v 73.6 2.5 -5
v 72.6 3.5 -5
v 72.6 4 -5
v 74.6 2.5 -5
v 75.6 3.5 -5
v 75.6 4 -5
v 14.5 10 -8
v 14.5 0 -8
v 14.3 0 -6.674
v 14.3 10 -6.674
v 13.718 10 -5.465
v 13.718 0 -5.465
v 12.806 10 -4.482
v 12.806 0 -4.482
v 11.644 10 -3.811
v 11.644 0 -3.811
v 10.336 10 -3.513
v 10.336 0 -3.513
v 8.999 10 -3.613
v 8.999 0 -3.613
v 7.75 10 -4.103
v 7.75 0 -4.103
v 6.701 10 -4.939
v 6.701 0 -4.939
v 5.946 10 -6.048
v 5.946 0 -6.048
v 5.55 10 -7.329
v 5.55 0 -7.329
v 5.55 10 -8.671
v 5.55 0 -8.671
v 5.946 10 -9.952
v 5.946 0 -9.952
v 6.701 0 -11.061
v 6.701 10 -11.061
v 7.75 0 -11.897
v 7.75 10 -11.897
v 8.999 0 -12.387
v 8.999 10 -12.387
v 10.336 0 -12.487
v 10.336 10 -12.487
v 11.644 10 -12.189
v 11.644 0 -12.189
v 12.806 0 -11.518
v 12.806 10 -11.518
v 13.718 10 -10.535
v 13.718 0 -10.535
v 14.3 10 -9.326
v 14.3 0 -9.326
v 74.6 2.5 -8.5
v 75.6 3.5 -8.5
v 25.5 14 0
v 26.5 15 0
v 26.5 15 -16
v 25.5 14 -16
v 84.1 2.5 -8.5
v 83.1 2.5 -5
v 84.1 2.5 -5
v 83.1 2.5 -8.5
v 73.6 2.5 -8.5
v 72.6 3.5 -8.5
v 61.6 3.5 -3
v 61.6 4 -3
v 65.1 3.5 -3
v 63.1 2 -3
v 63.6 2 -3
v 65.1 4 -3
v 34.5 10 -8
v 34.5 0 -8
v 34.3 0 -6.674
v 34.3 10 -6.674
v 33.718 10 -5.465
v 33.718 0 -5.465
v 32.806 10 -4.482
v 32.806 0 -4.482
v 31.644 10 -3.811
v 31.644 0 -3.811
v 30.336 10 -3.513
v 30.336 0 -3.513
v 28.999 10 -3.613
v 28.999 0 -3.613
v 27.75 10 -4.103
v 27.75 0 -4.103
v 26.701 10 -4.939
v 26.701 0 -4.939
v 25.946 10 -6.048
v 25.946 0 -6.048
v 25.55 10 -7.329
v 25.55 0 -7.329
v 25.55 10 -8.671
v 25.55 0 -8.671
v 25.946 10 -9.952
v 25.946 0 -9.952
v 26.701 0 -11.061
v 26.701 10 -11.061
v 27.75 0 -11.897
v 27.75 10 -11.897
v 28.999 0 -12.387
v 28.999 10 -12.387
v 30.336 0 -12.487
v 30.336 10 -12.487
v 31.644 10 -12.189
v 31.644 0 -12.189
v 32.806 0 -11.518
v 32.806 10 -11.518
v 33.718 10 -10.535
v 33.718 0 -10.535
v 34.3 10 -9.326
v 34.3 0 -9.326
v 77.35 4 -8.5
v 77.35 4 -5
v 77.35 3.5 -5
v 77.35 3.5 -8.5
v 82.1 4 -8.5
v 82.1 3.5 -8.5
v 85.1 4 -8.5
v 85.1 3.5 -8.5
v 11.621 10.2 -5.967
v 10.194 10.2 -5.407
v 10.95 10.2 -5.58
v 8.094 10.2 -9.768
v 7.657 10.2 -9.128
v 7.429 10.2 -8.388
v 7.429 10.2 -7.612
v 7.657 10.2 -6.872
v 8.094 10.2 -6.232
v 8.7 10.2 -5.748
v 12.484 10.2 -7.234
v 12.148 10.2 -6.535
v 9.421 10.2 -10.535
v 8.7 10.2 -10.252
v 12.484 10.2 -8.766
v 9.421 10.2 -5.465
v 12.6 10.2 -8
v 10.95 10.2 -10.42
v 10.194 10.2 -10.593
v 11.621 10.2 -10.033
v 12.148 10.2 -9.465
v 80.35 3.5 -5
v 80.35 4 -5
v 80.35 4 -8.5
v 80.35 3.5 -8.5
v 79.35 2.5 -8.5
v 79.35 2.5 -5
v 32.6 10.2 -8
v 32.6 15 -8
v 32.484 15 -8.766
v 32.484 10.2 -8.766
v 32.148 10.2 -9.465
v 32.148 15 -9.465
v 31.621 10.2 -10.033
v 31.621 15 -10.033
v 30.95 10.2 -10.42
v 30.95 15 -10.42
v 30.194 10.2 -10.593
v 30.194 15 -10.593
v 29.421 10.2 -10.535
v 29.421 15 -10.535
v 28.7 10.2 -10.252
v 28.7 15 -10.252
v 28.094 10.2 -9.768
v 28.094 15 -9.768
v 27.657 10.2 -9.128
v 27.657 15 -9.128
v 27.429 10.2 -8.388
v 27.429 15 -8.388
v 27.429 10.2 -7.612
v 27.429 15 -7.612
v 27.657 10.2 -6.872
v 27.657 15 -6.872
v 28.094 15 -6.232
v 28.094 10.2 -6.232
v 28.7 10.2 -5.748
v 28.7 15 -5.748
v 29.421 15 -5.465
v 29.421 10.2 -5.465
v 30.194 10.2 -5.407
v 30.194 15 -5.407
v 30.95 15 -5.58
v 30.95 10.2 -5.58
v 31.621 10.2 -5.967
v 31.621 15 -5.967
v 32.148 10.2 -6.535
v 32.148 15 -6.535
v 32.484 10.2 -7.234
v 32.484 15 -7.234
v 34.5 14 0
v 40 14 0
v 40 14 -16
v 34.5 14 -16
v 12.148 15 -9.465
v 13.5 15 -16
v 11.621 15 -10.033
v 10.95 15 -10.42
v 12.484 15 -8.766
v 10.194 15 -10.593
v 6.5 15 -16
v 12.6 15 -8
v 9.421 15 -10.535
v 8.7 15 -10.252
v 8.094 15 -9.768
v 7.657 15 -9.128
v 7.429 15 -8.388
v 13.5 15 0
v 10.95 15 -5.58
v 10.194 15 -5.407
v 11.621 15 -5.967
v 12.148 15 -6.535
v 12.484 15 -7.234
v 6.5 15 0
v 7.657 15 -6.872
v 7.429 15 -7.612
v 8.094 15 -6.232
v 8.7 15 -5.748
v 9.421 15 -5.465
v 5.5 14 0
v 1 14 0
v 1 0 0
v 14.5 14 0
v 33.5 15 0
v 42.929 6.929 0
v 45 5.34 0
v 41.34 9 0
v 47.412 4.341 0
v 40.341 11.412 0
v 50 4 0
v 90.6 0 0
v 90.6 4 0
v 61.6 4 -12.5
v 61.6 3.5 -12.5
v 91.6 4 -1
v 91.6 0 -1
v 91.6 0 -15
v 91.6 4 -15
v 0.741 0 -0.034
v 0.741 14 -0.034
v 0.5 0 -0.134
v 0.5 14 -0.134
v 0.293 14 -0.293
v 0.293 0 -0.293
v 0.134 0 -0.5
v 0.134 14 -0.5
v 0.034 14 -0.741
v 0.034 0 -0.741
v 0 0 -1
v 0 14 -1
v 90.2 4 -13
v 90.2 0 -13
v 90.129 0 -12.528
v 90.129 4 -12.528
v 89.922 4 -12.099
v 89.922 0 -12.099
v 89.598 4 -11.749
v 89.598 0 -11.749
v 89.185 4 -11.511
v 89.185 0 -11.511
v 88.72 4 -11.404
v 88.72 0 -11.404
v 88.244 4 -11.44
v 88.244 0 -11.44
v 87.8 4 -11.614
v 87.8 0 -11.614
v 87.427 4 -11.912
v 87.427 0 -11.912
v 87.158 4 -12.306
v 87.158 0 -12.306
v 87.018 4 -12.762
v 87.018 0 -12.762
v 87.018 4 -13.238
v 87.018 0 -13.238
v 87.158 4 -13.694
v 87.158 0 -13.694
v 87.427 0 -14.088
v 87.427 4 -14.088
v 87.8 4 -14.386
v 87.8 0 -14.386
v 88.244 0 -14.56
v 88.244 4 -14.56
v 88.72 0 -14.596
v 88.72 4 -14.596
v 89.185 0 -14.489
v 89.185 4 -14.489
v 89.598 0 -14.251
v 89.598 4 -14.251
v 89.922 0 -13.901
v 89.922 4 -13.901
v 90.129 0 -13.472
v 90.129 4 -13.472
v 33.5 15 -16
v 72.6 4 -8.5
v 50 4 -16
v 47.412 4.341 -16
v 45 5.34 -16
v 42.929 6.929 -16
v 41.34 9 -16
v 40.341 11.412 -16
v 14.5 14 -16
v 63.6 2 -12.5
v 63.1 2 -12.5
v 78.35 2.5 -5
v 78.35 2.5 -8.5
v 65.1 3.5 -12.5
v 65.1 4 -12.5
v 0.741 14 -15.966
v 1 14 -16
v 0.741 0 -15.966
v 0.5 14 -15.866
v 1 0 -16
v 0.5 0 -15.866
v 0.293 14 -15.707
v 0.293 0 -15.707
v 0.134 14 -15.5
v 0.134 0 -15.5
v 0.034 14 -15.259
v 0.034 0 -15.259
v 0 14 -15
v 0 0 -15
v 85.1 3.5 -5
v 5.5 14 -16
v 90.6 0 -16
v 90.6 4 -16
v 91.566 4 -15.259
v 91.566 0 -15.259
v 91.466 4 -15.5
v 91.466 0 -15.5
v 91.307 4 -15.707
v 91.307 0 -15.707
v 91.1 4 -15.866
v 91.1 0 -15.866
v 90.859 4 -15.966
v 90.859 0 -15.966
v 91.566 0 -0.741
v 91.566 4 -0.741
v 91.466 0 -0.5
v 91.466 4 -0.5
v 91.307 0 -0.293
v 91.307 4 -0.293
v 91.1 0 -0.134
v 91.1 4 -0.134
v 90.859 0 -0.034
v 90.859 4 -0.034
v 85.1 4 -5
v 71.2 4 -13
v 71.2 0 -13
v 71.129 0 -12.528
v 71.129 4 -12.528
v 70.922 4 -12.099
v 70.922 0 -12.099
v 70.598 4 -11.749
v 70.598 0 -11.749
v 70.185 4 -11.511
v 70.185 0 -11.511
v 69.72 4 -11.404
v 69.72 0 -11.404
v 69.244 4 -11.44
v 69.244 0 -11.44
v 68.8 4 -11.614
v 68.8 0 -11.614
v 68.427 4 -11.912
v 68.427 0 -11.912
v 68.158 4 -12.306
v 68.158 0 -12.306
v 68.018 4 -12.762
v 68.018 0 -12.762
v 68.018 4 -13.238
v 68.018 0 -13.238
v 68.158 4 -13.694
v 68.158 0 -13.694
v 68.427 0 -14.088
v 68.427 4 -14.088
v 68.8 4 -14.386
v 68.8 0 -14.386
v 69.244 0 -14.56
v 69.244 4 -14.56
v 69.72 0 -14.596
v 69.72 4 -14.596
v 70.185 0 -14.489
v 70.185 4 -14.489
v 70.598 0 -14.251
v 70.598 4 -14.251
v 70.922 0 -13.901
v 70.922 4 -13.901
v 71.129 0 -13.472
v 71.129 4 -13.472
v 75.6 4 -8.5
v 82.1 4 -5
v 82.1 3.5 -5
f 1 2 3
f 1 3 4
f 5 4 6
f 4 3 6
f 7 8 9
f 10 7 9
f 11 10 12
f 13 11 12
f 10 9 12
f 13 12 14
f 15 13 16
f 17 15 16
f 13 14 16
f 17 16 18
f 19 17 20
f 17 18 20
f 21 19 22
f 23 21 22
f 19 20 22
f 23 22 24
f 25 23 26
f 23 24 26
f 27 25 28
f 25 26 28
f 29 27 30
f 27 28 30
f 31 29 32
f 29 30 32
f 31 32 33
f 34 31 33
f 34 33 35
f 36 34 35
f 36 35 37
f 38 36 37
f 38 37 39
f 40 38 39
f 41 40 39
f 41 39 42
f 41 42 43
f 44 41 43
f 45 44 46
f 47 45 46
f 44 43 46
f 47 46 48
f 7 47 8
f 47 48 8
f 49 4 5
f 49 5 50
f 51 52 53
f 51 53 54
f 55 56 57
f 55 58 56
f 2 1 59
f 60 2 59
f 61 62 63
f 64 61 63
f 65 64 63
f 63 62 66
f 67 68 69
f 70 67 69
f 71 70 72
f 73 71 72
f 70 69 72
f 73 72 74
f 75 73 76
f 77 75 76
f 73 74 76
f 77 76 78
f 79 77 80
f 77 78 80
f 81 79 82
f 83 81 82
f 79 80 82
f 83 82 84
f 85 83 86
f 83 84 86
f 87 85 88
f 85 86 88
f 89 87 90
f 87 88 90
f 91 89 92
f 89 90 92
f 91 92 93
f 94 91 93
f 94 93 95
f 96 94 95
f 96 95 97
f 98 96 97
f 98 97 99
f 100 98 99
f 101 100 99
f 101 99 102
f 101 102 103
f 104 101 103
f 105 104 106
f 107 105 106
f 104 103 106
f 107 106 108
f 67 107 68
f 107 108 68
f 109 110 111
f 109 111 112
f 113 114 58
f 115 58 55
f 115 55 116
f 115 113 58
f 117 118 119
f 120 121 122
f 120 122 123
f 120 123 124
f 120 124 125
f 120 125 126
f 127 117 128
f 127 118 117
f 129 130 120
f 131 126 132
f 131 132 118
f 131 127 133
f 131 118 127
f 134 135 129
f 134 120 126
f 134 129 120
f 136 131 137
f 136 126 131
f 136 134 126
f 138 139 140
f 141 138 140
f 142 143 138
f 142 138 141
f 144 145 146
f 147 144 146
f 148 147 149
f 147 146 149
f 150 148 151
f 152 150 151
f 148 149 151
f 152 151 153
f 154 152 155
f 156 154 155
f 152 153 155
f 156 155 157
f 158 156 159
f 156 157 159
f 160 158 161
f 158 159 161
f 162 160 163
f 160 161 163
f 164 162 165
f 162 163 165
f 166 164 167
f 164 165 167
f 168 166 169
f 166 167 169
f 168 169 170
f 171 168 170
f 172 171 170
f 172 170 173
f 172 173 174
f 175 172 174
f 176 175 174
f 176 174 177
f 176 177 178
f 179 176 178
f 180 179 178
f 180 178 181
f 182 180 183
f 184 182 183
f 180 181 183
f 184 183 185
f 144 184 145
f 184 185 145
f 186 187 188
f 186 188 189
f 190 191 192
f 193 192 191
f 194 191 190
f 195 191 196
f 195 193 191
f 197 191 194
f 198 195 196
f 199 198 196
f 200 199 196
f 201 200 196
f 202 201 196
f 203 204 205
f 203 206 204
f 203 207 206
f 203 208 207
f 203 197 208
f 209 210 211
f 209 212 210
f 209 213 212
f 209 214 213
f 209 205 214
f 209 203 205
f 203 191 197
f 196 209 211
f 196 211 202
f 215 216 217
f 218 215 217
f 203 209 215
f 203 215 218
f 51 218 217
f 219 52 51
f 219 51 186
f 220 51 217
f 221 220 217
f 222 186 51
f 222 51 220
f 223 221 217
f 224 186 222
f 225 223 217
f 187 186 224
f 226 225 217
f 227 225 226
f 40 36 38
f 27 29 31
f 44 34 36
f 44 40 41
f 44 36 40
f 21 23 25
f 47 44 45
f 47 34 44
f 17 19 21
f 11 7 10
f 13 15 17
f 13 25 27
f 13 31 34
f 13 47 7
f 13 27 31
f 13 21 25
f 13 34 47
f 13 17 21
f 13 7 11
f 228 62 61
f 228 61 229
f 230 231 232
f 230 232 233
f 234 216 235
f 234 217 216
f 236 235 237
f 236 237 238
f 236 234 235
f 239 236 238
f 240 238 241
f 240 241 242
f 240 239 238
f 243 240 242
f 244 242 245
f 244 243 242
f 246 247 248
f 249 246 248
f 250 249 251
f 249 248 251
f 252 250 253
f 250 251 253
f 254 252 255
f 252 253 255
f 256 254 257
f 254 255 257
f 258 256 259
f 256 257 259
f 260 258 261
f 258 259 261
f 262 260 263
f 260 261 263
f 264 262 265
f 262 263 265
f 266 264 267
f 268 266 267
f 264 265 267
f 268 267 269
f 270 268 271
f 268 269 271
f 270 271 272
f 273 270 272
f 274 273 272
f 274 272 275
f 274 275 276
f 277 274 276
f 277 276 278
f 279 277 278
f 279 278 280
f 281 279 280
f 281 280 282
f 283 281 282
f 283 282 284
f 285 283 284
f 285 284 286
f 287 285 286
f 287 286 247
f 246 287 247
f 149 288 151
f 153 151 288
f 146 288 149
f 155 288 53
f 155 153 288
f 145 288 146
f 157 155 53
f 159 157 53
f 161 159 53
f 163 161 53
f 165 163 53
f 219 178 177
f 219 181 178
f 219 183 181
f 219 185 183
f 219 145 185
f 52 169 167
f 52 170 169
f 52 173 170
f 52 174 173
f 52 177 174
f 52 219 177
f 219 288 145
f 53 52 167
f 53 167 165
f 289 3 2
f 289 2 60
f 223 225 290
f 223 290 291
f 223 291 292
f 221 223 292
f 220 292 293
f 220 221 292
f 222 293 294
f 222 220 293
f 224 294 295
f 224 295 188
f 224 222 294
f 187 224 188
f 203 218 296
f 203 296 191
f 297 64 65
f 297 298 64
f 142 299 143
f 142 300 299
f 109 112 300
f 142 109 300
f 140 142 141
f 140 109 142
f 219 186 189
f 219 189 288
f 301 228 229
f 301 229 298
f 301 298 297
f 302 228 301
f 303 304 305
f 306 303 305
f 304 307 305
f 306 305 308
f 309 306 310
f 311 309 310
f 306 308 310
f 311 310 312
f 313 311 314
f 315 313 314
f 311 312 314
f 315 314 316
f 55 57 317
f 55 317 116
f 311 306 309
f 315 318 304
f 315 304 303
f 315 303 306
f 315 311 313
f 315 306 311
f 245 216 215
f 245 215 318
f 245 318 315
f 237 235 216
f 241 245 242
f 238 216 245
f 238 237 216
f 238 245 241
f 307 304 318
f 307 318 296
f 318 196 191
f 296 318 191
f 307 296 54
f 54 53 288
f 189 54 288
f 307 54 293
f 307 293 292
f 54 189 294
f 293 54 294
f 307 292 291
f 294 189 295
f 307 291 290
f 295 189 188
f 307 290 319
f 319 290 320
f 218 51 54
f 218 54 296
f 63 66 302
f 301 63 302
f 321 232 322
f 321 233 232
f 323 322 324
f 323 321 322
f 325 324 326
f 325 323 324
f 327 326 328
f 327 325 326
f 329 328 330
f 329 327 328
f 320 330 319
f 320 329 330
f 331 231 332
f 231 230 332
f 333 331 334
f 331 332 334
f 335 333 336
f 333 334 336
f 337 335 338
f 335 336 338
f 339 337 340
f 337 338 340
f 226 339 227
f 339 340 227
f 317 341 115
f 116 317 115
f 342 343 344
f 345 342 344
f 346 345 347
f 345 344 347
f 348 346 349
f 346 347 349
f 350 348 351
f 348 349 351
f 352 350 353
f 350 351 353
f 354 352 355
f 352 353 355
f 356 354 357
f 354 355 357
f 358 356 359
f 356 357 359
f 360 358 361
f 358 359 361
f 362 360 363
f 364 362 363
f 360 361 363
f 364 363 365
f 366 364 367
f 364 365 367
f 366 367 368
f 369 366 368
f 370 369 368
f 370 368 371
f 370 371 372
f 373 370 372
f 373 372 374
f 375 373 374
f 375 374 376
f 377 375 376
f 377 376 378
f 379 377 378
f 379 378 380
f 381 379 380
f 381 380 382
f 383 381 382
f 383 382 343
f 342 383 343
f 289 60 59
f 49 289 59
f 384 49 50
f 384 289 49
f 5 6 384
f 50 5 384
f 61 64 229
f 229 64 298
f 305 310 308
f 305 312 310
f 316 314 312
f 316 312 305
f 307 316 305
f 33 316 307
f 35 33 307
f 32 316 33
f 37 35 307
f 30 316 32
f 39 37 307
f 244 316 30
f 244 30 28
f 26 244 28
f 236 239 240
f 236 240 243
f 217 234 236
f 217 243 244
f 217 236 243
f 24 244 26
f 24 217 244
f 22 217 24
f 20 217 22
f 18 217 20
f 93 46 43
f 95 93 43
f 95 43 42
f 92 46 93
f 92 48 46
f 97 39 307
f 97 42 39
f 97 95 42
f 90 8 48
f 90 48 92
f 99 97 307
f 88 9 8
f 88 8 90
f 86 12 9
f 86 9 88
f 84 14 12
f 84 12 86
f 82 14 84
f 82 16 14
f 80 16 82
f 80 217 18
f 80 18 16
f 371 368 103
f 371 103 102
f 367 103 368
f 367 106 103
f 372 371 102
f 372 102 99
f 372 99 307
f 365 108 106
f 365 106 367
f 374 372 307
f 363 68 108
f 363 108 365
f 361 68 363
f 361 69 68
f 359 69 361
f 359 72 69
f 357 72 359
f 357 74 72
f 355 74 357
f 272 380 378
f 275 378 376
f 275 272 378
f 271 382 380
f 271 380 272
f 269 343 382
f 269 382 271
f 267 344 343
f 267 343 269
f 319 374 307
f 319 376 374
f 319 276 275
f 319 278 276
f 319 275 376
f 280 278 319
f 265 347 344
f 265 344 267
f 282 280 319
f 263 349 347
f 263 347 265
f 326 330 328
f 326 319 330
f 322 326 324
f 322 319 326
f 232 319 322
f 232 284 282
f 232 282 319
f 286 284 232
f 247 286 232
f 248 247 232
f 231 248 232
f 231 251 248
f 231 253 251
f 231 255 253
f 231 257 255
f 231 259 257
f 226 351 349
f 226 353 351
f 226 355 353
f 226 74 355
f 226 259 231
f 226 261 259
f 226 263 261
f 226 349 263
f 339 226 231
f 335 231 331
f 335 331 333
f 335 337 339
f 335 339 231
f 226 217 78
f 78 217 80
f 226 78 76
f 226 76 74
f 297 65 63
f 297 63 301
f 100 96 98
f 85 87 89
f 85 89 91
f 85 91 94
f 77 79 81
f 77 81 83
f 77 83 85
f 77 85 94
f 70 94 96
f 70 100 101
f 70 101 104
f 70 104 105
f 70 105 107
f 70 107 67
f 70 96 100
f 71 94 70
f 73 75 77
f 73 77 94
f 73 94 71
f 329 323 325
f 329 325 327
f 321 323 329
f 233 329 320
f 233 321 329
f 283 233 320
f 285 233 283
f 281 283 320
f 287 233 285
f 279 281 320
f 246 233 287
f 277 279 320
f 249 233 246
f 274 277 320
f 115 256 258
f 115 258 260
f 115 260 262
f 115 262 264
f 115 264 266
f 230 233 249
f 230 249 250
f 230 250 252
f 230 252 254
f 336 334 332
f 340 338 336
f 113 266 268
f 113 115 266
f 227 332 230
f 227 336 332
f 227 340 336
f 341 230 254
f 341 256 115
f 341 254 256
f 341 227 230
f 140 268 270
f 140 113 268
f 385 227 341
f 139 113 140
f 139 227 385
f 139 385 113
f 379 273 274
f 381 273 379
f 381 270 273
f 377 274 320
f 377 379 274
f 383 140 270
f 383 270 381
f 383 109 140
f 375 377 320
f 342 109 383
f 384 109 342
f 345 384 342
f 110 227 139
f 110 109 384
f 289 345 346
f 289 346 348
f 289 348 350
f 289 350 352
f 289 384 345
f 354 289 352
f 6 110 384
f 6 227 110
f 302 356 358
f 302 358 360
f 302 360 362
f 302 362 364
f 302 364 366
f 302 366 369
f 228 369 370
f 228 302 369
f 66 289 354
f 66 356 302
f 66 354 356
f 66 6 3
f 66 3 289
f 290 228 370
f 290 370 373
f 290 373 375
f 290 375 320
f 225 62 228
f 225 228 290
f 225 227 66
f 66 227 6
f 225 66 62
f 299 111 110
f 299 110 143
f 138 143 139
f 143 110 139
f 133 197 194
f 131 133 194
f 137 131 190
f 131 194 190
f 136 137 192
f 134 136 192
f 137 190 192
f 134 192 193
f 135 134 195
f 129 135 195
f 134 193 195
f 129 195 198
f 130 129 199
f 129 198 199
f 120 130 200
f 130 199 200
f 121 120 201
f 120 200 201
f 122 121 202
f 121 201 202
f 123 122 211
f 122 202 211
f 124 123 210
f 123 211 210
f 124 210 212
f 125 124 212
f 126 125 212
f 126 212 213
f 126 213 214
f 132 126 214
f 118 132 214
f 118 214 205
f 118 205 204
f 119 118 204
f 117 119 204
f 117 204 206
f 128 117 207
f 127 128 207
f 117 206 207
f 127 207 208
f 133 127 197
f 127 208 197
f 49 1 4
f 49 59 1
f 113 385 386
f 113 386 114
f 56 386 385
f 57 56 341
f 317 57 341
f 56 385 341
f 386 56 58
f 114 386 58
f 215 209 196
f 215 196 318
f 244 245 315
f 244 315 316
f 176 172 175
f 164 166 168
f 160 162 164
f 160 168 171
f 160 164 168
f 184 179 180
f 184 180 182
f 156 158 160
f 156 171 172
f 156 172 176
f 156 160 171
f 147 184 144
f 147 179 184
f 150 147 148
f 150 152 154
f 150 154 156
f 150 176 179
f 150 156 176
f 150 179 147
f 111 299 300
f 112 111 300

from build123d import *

# Parameters (mm, degrees)
BOSS_EXTRUDE1_DEPTH = 16
SKETCH2_R           = 2.6
CUT_EXTRUDE1_DEPTH  = 4.8
SKETCH3_R           = 4.5
CUT_EXTRUDE2_DEPTH  = 10
CUT_EXTRUDE3_REACH  = 17
SKETCH4_R           = 1.6
SKETCH5_W           = 3
SKETCH5_H           = 3.5
CUT_EXTRUDE4_DEPTH  = 1.5
CHAMFER1_SIZE       = 1
SKETCH6_W           = 3.5
SKETCH6_H           = 9.5
CUT_EXTRUDE5_DEPTH  = 2
CHAMFER2_SIZE       = 1.5
FILLET1_R           = 1


with BuildPart() as part:
    # Sketch1 → Boss-Extrude1 (new body)
    with BuildSketch(Plane.XY):
        with BuildLine():
            Line((0, 0), (91.6, 0))
            Line((91.6, 0), (91.6, 4))
            Line((91.6, 4), (50, 4))
            ThreePointArc((50, 4), (42.928932188, 6.928932188), (40, 14))
            Line((40, 14), (34.5, 14))
            Line((34.5, 14), (33.5, 15))
            Line((33.5, 15), (26.5, 15))
            Line((26.5, 15), (25.5, 14))
            Line((25.5, 14), (14.5, 14))
            Line((14.5, 14), (13.5, 15))
            Line((13.5, 15), (6.5, 15))
            Line((6.5, 15), (5.5, 14))
            Line((5.5, 14), (0, 14))
            Line((0, 14), (0, 0))
        make_face()
    extrude(amount=-BOSS_EXTRUDE1_DEPTH)

    # Sketch2 → Cut-Extrude1 (cut)
    with BuildSketch(Plane(origin=(0, 15, 0), x_dir=(1, 0, 0), z_dir=(0, 1, 0))):
        with Locations((10, 8)):
            Circle(SKETCH2_R)
        with Locations((30, 8)):
            Circle(SKETCH2_R)
    extrude(amount=-CUT_EXTRUDE1_DEPTH, mode=Mode.SUBTRACT)

    # Sketch3 → Cut-Extrude2 (cut)
    with BuildSketch(Plane.XZ):
        with Locations((10, -8)):
            Circle(SKETCH3_R)
        with Locations((30, -8)):
            Circle(SKETCH3_R)
    extrude(amount=-CUT_EXTRUDE2_DEPTH, mode=Mode.SUBTRACT)

    # Sketch4 → Cut-Extrude3 (cut, up to next)
    with BuildSketch(Plane.XZ, mode=Mode.PRIVATE) as cut_extrude3_sk1:
        with Locations((88.6, -13)):
            Circle(SKETCH4_R)
    cut_extrude3_tool1 = extrude(cut_extrude3_sk1.sketch, amount=-CUT_EXTRUDE3_REACH, mode=Mode.PRIVATE) & part.part
    add(cut_extrude3_tool1.solids().sort_by_distance((88.6, 0, -13))[0], mode=Mode.SUBTRACT)
    # Sketch4 → Cut-Extrude3 (cut, up to next)
    with BuildSketch(Plane.XZ, mode=Mode.PRIVATE) as cut_extrude3_sk2:
        with Locations((69.6, -13)):
            Circle(SKETCH4_R)
    cut_extrude3_tool2 = extrude(cut_extrude3_sk2.sketch, amount=-CUT_EXTRUDE3_REACH, mode=Mode.PRIVATE) & part.part
    add(cut_extrude3_tool2.solids().sort_by_distance((69.6, 0, -13))[0], mode=Mode.SUBTRACT)

    # Sketch5 → Cut-Extrude4 (cut)
    with BuildSketch(Plane(origin=(0, 4, 0), x_dir=(1, 0, 0), z_dir=(0, 1, 0))):
        with Locations((74.1, 6.75)):
            Rectangle(SKETCH5_W, SKETCH5_H)
        with Locations((78.85, 6.75)):
            Rectangle(SKETCH5_W, SKETCH5_H)
        with Locations((83.6, 6.75)):
            Rectangle(SKETCH5_W, SKETCH5_H)
    extrude(amount=-CUT_EXTRUDE4_DEPTH, mode=Mode.SUBTRACT)

    # Chamfer1
    chamfer1_edges = [part.edges().sort_by_distance(p)[0] for p in [
        (72.6, 2.5, -6.75),
        (75.6, 2.5, -6.75),
        (77.35, 2.5, -6.75),
        (80.35, 2.5, -6.75),
        (82.1, 2.5, -6.75),
        (85.1, 2.5, -6.75),
    ]]
    chamfer(chamfer1_edges, length=CHAMFER1_SIZE)

    # Sketch6 → Cut-Extrude5 (cut)
    with BuildSketch(Plane(origin=(0, 4, 0), x_dir=(1, 0, 0), z_dir=(0, 1, 0))):
        with Locations((63.35, 7.75)):
            Rectangle(SKETCH6_W, SKETCH6_H)
    extrude(amount=-CUT_EXTRUDE5_DEPTH, mode=Mode.SUBTRACT)

    # Chamfer2
    chamfer2_edges = [part.edges().sort_by_distance(p)[0] for p in [
        (65.1, 2, -7.75),
        (61.6, 2, -7.75),
    ]]
    chamfer(chamfer2_edges, length=CHAMFER2_SIZE)

    # Fillet1
    fillet1_edges = [part.edges().sort_by_distance(p)[0] for p in [
        (91.6, 2, -16),
        (91.6, 2, 0),
        (0, 7, 0),
        (0, 7, -16),
    ]]
    fillet(fillet1_edges, radius=FILLET1_R)


solid = part.part
